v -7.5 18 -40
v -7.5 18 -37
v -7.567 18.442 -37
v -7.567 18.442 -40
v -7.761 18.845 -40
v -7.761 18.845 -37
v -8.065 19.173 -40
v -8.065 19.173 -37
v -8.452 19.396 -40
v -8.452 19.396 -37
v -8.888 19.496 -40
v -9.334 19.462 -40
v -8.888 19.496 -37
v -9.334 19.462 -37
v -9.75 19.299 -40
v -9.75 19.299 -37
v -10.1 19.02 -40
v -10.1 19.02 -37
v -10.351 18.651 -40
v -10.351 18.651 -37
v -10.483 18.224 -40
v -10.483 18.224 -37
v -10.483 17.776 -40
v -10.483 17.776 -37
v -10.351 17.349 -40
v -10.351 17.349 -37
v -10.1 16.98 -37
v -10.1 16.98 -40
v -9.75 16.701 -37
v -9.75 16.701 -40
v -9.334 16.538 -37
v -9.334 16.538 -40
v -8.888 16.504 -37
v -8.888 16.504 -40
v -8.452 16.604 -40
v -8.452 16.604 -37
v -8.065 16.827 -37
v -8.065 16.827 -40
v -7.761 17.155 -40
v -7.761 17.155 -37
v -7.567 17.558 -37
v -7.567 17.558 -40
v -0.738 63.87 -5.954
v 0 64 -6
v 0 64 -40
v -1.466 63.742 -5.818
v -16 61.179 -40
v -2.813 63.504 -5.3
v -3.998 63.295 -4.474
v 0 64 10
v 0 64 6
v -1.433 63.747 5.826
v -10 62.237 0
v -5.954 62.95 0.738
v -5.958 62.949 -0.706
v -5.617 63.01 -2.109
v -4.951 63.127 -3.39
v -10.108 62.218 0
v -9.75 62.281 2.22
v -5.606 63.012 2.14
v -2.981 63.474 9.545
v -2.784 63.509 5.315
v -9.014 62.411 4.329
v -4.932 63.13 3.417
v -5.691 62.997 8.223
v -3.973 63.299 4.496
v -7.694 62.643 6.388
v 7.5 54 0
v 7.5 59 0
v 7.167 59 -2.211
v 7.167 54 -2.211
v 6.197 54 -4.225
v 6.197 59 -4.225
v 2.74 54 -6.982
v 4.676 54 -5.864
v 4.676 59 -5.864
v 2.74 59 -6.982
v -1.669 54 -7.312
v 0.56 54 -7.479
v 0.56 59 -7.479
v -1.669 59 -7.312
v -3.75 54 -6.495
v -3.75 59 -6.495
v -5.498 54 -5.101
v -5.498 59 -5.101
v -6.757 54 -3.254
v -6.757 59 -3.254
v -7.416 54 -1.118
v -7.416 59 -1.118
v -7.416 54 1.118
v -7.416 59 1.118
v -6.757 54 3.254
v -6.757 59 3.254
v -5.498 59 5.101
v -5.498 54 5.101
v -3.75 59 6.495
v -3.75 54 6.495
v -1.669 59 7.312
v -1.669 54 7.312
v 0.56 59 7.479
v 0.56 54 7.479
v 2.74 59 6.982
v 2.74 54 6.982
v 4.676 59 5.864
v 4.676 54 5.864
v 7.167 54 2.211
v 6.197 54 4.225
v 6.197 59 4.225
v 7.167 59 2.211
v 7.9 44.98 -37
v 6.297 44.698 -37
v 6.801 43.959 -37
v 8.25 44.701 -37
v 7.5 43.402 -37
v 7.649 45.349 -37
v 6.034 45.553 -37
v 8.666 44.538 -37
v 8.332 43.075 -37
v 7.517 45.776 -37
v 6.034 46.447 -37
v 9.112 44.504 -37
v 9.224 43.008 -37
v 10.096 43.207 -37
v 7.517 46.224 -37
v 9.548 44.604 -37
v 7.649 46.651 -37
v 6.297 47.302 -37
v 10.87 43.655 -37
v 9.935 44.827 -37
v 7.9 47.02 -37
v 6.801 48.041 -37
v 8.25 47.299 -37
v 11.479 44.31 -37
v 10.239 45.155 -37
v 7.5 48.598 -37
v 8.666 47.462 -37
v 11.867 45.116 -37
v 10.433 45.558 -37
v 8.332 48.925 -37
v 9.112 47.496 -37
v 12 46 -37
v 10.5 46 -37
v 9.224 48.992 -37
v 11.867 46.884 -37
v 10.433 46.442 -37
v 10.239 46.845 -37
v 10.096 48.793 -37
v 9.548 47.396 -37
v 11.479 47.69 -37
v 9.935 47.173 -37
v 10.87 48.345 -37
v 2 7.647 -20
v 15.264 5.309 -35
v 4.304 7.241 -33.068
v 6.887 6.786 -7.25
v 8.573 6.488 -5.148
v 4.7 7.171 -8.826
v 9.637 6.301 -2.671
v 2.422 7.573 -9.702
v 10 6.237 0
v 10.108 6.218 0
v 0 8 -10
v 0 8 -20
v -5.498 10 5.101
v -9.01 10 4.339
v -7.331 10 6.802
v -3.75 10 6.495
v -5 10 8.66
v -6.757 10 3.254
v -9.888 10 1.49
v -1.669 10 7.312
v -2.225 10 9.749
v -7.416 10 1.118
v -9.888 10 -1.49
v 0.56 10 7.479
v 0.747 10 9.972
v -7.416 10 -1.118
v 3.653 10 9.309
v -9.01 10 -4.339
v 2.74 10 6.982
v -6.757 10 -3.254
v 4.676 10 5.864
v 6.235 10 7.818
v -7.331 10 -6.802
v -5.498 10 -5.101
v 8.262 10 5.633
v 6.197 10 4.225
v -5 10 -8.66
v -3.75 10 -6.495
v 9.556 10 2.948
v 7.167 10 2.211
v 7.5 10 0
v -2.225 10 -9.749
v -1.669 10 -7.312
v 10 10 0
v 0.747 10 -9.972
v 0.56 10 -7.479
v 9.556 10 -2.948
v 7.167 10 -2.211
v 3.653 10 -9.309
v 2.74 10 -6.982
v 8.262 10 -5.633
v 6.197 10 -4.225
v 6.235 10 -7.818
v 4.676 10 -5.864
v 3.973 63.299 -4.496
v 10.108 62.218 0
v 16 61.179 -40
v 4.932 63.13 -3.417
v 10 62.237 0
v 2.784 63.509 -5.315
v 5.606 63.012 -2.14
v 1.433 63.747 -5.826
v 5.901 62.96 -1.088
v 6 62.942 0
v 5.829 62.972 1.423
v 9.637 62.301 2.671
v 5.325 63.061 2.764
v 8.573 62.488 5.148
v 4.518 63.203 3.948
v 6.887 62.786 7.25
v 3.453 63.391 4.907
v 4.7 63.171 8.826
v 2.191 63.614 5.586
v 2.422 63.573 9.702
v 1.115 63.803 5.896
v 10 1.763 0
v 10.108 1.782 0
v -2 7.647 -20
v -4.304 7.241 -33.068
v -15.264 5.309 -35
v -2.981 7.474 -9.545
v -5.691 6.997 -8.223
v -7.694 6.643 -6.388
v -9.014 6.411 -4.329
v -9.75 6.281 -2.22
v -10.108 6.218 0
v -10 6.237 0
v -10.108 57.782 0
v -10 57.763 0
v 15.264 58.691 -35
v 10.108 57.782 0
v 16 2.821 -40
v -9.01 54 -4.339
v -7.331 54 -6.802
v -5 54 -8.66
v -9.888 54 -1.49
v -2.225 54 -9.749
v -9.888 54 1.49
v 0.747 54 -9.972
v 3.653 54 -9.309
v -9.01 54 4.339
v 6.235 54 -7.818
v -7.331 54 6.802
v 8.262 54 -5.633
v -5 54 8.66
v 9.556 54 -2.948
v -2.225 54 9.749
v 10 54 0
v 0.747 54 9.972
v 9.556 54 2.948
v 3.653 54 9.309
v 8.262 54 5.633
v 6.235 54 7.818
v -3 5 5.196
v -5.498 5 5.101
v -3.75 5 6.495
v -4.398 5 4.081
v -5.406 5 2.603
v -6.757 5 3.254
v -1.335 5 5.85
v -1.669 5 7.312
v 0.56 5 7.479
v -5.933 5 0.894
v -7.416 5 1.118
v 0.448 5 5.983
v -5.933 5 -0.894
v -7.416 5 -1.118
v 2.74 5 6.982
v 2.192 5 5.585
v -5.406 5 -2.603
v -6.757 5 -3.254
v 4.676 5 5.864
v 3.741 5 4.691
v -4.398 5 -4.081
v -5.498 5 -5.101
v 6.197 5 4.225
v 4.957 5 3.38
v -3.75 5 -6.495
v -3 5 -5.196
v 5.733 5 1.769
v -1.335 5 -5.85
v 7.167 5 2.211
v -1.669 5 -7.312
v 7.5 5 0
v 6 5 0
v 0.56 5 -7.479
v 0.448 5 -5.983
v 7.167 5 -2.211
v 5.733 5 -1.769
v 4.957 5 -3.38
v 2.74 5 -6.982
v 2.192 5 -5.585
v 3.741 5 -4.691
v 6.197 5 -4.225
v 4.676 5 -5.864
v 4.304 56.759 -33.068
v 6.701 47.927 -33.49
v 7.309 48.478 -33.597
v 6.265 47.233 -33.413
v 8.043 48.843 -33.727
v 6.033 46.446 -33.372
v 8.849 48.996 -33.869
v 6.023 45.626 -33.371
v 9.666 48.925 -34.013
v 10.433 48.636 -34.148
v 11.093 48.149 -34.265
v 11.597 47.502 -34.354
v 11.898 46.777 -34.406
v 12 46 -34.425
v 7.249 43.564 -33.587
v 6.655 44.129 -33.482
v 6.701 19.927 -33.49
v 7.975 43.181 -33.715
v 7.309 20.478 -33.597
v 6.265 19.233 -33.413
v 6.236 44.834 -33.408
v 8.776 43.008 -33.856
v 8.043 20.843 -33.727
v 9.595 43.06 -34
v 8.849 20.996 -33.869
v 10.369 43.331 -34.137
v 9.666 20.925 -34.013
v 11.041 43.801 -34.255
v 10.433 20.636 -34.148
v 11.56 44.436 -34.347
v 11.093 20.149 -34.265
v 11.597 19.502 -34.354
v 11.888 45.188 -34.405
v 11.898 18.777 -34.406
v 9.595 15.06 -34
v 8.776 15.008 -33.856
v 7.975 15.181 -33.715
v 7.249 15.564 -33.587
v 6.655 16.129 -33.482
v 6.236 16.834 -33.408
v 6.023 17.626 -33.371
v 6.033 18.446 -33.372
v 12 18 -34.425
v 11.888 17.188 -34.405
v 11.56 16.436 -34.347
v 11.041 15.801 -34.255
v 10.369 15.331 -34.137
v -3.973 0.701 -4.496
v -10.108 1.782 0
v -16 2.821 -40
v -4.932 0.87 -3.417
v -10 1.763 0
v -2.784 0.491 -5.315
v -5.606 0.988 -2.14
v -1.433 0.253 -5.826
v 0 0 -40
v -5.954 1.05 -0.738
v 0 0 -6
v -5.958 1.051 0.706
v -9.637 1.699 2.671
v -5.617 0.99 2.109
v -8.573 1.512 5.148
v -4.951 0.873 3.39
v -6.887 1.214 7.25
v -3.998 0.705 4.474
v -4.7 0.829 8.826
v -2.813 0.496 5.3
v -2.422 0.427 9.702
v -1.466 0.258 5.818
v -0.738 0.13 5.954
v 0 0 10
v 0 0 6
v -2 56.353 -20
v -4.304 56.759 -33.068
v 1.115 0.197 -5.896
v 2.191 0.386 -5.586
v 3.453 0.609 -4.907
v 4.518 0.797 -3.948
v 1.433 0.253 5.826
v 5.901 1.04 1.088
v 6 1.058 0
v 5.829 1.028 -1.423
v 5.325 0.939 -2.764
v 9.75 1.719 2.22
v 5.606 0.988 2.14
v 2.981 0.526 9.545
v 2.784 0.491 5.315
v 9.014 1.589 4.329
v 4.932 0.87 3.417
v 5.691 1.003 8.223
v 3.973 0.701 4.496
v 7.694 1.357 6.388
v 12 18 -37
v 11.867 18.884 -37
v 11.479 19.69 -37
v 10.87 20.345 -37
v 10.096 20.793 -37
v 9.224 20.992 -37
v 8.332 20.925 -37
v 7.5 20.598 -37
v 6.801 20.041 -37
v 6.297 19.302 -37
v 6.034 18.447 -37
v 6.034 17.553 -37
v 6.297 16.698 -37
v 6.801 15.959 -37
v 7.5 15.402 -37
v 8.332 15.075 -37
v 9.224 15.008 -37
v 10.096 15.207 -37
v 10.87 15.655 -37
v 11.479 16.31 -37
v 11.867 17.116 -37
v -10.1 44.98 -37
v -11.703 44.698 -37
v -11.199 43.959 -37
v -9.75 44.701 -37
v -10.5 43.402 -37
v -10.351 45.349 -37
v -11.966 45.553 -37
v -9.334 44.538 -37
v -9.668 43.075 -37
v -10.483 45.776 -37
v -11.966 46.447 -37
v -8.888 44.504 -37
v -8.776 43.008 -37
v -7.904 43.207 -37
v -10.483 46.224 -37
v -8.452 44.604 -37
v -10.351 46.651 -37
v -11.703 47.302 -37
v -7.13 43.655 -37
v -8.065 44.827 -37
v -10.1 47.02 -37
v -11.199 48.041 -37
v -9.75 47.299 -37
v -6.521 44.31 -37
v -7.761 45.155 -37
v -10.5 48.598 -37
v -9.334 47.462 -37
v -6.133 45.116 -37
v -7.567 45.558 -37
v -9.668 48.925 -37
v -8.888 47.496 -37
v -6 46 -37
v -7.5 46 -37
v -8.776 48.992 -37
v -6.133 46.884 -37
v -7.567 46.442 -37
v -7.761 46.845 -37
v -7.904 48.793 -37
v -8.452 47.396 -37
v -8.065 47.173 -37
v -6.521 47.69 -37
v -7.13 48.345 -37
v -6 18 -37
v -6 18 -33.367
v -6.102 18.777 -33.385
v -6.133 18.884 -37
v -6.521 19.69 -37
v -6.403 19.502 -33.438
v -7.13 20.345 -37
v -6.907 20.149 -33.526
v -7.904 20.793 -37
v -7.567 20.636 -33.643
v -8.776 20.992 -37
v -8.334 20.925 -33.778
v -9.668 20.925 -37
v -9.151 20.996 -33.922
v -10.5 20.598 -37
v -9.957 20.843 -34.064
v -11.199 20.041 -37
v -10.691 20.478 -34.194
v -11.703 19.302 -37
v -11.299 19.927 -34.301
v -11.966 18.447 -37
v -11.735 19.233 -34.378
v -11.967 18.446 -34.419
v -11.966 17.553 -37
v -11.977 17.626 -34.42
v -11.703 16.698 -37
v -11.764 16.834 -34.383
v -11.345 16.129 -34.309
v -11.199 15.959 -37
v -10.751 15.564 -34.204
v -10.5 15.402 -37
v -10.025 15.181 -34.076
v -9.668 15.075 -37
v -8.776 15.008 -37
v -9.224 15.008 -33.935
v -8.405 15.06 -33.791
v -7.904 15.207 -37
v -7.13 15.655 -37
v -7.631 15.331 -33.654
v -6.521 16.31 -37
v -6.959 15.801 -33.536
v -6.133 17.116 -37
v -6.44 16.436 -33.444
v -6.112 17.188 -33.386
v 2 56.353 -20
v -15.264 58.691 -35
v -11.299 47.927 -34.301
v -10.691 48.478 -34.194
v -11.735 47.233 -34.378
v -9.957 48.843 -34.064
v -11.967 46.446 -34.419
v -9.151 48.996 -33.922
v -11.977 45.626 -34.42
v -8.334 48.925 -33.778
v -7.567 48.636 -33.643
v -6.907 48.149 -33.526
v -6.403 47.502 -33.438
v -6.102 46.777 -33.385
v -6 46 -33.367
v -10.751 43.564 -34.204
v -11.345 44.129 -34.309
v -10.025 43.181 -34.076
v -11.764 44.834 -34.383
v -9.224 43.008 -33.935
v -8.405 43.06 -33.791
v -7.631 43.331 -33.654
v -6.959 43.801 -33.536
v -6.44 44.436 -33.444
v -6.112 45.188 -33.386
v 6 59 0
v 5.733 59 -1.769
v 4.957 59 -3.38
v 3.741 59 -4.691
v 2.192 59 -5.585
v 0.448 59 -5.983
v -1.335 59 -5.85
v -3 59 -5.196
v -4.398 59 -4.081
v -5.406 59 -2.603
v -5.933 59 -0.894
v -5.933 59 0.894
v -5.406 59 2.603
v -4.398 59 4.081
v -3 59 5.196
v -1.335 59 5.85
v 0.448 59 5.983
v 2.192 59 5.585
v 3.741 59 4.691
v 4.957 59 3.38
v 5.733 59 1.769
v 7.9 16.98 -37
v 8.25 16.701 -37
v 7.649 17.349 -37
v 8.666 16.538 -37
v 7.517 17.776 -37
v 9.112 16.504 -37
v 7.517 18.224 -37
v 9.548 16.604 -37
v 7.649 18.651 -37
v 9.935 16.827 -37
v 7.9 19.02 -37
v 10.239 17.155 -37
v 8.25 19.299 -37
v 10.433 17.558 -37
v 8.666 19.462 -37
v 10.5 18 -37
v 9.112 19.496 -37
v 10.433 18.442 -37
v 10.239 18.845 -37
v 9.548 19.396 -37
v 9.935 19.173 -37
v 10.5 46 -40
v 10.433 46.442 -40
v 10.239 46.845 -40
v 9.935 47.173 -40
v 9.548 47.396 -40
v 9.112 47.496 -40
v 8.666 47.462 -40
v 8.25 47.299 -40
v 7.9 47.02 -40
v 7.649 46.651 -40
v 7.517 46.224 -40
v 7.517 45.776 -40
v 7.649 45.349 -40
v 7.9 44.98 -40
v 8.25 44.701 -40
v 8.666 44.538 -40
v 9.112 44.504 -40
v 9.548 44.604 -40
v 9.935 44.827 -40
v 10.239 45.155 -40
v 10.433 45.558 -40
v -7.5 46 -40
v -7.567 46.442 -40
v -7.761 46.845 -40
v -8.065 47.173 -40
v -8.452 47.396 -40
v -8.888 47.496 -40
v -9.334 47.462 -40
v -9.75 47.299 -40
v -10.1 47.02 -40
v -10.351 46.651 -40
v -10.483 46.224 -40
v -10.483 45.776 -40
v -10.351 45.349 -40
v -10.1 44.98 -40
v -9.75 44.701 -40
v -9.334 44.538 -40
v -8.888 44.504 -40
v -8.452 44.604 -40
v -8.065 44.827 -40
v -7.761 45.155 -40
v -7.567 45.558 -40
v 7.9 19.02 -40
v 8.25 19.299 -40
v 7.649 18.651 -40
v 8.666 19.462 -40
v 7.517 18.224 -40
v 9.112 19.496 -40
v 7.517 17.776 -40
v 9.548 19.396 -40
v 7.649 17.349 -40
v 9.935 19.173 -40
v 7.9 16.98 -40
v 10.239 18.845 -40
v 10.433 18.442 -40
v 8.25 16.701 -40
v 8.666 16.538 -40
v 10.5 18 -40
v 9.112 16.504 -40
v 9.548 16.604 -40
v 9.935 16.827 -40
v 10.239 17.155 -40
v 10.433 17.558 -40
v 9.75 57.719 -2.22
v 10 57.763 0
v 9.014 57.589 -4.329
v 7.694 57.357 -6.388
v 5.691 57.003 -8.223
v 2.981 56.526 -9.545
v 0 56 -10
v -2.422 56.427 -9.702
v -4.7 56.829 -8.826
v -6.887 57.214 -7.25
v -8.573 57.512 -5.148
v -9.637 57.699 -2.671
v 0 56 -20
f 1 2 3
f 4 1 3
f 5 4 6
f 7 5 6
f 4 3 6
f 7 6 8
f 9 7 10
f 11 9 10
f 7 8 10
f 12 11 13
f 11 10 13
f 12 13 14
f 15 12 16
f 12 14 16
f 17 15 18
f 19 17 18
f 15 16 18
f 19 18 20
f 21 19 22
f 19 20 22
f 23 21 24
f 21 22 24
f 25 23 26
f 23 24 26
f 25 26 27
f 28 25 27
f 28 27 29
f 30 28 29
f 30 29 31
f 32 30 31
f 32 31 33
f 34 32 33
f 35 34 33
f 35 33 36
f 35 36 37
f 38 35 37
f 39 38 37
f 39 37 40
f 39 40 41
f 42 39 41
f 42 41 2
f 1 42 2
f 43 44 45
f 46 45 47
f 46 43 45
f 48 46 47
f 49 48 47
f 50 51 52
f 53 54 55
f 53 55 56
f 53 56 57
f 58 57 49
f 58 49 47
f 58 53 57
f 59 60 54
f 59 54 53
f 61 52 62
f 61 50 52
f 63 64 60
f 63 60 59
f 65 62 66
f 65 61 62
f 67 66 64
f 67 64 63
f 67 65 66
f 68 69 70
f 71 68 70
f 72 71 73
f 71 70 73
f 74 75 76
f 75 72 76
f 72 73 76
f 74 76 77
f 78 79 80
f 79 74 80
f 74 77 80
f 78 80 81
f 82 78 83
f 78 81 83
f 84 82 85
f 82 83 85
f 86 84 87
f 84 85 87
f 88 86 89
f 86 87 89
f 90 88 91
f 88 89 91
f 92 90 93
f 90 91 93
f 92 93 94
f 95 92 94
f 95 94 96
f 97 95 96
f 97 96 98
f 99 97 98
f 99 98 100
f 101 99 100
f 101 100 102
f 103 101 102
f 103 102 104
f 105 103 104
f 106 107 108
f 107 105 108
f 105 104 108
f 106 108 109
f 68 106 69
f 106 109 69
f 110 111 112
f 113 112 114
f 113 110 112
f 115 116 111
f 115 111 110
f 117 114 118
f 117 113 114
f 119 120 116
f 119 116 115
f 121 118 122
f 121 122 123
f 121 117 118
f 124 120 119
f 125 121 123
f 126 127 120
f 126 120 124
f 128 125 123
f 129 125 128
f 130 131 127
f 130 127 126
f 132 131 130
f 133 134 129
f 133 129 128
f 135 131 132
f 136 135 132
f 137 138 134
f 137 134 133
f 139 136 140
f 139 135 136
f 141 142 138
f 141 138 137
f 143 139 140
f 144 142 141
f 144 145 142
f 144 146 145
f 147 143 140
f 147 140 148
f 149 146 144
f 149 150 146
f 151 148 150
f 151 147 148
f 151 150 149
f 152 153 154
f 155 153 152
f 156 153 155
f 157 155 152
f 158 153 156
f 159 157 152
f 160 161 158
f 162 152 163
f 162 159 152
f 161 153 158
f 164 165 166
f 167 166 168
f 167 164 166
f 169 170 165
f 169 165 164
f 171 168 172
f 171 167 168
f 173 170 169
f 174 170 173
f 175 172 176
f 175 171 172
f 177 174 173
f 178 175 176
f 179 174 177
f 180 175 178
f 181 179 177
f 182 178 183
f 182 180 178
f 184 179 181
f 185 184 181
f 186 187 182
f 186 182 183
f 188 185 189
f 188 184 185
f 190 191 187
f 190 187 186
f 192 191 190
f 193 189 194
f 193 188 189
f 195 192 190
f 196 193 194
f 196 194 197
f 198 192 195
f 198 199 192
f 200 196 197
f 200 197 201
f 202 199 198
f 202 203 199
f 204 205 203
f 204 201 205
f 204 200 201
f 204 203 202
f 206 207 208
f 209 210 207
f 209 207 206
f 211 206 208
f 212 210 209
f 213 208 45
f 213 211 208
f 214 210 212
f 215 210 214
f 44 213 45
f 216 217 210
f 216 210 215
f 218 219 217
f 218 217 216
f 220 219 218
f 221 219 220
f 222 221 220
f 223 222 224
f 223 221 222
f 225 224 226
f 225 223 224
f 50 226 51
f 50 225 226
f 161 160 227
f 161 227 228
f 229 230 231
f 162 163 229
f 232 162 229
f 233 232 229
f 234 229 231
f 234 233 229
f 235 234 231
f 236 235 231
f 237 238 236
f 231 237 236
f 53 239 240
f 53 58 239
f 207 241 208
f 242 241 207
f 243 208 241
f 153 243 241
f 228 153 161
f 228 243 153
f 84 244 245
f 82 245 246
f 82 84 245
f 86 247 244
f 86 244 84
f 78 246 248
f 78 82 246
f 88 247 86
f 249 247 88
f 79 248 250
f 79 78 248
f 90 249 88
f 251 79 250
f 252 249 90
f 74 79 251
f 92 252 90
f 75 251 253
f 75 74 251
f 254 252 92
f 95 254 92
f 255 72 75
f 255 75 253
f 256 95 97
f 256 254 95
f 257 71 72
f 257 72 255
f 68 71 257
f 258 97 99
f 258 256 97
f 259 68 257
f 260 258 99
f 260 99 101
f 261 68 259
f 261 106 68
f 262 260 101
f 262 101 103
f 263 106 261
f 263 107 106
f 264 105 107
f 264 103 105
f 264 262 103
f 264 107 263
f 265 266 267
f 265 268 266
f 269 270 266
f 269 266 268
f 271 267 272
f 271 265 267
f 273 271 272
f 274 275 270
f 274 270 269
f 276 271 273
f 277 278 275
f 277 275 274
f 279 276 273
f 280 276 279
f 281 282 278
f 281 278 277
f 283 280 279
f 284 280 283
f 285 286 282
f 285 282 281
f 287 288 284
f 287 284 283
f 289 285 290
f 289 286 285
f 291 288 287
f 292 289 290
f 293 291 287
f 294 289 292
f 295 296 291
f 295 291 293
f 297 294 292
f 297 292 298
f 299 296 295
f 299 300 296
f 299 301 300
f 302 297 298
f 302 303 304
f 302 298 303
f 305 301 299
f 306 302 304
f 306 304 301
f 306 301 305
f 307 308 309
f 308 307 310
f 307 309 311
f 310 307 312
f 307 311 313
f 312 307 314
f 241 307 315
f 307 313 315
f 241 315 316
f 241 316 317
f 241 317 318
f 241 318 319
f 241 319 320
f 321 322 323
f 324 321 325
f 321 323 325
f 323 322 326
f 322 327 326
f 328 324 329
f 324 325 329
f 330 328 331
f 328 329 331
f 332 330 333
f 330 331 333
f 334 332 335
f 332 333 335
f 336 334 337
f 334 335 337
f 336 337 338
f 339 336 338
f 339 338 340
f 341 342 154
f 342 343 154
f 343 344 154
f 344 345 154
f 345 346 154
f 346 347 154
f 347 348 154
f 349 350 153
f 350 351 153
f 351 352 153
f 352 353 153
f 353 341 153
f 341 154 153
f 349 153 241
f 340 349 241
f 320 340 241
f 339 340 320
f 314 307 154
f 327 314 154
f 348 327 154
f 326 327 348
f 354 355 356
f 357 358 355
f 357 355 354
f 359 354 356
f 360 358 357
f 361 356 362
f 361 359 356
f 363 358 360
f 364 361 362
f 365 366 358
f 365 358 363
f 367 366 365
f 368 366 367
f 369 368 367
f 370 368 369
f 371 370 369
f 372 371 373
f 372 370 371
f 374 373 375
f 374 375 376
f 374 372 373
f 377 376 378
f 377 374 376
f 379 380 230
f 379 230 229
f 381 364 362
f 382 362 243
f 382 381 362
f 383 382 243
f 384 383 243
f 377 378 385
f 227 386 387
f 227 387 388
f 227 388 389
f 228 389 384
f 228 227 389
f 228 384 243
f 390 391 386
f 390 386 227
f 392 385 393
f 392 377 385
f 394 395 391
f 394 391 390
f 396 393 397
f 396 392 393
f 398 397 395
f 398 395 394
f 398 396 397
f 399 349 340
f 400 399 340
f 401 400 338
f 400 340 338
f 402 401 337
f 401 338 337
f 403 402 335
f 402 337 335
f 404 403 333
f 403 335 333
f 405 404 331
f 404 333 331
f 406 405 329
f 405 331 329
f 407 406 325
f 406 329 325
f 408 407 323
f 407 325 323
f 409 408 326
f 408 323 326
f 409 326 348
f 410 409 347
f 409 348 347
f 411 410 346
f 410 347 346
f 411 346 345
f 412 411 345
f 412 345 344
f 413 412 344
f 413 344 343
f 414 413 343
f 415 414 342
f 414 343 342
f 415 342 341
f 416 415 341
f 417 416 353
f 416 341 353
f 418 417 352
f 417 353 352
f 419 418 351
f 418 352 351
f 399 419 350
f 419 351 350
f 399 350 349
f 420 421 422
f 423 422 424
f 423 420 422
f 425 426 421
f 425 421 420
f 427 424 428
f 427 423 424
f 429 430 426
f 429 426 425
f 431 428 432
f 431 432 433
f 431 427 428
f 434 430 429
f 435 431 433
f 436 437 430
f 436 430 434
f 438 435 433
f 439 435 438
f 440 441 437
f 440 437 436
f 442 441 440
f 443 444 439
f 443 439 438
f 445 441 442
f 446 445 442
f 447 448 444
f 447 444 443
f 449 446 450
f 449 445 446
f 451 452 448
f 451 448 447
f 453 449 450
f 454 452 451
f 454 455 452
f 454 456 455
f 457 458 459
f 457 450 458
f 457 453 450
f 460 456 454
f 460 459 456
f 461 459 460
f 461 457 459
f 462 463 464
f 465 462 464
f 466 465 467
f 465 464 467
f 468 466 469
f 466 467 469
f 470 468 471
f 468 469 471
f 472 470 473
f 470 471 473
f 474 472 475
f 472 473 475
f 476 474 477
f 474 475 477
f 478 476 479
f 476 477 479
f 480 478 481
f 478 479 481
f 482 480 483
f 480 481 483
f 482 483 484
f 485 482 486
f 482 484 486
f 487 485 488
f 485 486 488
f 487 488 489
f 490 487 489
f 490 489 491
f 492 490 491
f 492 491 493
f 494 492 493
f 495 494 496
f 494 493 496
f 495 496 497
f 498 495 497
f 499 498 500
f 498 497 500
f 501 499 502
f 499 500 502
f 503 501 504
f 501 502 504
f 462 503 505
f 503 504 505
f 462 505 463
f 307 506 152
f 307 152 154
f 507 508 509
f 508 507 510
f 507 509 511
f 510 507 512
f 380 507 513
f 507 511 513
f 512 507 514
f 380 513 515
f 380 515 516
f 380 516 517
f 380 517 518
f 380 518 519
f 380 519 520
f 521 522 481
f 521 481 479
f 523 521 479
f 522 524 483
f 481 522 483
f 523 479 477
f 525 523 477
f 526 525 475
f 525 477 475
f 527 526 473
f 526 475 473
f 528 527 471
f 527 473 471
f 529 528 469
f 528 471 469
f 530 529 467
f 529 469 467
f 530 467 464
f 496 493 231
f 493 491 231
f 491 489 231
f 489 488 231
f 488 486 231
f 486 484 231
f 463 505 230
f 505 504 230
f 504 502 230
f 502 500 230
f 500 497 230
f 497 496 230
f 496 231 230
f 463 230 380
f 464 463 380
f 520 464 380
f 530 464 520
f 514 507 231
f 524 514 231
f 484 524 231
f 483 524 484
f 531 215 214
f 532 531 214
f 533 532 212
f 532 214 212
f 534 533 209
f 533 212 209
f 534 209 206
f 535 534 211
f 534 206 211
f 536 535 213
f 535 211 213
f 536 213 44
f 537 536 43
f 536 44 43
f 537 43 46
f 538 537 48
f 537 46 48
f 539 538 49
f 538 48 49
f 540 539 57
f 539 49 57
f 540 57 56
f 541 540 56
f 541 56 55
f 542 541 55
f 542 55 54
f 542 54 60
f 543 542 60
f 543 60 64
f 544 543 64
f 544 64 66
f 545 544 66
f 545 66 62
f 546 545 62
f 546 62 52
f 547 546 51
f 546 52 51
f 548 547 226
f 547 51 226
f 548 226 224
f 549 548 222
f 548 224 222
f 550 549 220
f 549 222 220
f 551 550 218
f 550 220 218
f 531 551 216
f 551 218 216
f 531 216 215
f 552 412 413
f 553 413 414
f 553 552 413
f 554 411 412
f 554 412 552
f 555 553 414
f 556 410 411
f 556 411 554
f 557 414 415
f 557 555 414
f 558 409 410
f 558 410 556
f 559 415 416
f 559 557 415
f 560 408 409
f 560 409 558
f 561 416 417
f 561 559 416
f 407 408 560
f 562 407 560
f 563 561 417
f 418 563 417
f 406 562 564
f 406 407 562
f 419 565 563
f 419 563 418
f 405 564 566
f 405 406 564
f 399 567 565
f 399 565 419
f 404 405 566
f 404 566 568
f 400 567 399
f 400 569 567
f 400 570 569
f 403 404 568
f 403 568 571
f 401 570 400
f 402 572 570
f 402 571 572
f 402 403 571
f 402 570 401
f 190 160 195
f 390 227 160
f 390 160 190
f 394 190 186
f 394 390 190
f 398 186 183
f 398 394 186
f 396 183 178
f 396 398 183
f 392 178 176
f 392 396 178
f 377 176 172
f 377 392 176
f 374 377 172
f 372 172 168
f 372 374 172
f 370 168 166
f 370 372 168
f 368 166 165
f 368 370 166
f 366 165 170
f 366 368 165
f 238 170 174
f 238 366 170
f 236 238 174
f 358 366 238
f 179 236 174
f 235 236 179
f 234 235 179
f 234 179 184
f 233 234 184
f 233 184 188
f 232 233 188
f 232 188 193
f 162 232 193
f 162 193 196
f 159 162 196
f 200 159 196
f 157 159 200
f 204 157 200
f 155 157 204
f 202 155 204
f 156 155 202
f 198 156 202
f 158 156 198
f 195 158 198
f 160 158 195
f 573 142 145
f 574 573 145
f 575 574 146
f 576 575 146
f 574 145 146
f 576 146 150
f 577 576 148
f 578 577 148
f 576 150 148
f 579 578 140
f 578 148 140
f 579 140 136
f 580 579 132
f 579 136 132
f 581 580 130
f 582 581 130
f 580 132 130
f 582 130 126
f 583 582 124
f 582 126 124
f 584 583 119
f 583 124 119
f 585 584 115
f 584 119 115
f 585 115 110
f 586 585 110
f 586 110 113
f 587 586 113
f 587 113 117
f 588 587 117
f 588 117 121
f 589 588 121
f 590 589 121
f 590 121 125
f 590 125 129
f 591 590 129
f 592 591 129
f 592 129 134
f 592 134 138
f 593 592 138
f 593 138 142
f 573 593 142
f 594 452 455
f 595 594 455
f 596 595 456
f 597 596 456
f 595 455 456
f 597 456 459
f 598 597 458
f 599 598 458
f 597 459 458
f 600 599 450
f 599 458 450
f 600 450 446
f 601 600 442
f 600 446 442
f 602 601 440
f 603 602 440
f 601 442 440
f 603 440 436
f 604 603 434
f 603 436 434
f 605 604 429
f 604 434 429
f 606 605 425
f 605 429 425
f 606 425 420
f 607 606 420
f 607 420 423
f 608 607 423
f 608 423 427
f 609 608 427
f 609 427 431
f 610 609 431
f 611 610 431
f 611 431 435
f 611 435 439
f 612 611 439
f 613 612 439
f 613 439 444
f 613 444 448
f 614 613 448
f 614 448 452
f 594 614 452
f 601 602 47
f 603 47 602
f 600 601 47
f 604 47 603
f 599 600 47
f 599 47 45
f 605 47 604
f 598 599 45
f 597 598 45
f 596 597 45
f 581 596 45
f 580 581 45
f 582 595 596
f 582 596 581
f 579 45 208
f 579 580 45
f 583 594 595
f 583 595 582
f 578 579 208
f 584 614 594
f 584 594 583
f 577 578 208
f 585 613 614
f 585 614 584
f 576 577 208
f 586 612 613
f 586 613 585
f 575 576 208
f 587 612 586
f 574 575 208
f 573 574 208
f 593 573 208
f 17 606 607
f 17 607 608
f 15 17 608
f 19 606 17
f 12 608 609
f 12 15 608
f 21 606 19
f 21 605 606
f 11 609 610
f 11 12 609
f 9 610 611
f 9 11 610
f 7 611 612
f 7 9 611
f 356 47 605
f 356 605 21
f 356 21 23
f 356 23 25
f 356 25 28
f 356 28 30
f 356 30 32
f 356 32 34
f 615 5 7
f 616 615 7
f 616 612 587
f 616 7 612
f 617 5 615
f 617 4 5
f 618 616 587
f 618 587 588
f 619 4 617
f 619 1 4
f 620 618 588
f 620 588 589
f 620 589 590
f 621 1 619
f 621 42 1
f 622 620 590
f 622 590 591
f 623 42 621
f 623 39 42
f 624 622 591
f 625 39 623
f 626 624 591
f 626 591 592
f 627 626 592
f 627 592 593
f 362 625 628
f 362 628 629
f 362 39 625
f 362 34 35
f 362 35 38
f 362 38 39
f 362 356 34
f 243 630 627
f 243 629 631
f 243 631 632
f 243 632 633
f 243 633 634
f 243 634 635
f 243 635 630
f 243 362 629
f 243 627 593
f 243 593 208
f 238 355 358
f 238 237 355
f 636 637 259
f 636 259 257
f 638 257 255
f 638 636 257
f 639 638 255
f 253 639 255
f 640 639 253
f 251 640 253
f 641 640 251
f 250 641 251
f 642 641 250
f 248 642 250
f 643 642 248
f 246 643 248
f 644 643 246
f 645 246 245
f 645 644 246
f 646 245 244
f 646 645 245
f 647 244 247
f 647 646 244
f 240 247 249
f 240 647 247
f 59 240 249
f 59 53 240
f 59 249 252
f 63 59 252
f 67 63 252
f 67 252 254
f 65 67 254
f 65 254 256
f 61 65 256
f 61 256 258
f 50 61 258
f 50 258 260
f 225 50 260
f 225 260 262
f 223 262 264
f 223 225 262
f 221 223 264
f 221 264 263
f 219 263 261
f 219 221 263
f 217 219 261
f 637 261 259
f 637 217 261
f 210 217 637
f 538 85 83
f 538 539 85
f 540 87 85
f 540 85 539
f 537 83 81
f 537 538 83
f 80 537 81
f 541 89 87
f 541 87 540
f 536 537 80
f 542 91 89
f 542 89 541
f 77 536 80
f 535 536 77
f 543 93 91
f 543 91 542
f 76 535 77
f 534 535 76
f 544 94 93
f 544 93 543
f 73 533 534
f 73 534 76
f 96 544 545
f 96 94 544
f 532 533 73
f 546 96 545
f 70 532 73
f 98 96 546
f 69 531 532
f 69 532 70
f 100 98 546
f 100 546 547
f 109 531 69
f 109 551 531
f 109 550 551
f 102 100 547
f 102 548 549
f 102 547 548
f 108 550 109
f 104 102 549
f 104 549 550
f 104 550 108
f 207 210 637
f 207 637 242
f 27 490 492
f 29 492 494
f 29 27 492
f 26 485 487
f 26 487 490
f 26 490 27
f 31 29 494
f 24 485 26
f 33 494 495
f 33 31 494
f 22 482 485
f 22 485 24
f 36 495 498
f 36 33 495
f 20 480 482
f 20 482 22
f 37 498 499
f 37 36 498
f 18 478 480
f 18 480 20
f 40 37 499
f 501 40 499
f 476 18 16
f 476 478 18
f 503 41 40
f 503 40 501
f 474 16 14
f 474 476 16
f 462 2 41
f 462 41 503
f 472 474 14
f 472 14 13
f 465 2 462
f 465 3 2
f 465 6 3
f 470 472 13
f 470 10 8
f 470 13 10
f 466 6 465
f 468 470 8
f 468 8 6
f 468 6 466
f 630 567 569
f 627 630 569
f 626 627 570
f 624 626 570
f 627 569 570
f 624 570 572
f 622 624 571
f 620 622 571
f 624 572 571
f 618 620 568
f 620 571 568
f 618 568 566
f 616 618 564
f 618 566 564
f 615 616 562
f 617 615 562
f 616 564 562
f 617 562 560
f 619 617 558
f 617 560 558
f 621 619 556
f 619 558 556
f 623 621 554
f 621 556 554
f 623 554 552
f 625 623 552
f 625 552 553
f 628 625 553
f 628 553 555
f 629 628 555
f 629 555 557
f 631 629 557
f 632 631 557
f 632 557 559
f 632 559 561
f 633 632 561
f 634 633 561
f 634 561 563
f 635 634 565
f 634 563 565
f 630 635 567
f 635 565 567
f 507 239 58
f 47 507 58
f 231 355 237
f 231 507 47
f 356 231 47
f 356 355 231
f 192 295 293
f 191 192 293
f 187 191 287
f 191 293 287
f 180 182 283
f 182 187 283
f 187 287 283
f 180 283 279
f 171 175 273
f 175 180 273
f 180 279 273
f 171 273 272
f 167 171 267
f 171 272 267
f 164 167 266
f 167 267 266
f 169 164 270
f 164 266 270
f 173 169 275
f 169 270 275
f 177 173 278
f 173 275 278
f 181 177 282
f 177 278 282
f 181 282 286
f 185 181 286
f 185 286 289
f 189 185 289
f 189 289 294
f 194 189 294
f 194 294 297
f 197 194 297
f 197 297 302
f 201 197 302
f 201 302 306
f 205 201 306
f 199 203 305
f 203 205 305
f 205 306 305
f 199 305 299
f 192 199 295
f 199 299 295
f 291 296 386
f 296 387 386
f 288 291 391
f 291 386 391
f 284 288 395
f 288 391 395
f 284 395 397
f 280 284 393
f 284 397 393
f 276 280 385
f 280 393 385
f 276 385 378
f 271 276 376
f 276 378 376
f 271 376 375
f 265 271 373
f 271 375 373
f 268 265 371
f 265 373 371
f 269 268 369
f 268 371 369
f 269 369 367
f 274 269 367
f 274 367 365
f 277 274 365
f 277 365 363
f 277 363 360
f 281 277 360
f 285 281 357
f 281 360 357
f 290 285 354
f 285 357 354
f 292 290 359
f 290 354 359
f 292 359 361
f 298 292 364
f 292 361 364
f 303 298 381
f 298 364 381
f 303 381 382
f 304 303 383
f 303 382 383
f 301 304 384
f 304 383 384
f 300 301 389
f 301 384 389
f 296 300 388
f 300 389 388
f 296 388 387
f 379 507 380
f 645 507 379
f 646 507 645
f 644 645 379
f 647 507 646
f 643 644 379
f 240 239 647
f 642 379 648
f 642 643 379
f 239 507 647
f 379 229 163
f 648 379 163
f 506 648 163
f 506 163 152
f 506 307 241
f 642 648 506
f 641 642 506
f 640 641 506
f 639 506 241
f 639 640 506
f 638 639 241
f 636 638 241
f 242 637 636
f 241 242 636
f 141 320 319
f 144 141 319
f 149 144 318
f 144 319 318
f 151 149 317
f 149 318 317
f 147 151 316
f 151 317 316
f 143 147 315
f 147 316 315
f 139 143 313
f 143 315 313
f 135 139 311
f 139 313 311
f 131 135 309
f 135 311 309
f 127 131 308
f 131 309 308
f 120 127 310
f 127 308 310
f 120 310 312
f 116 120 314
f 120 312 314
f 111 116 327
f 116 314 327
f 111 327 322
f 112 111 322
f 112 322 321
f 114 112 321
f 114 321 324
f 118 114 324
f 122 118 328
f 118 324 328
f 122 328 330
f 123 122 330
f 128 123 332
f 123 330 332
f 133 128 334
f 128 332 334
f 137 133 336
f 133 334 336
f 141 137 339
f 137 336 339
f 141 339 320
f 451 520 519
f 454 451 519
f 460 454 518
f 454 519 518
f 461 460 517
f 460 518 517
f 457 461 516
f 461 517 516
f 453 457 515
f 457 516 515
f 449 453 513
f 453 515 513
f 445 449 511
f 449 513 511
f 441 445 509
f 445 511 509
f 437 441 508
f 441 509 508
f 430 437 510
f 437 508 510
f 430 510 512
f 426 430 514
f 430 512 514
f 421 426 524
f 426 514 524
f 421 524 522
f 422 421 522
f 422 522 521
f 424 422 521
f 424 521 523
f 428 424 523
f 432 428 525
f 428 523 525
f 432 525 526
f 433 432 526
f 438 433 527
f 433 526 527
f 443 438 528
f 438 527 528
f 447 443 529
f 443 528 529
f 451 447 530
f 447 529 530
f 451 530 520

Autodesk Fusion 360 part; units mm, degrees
sketch "草图1" plane through (0, 0, 0) normal (0, 1, 0) x (1, 0, 0)
  circle A0 centre (0, 0) radius 10
  circle A1 centre (0, 0) radius 7.5
  circle A2 centre (0, 0) radius 6
  line L0 (-9.8932, -1.4573) -> (-16, 40)
  line L1 (-16, 40) -> (16, 40)
  line L2 (16, 40) -> (9.8932, -1.4573)
  line L3 (0, -55) -> (0, 135) construction
  line L4 (-15.2635, 35) -> (-4.3042, 33.0676)
  line L5 (-4.3042, 33.0676) -> (-2, 20)
  line L6 (-2, 20) -> (2, 20)
  line L7 (2, 20) -> (4.3042, 33.0676)
  line L8 (4.3042, 33.0676) -> (15.2635, 35)
  dimension "d1" = 32
  dimension "d2" = 12
  dimension "d3" = 15
  dimension "d4" = 20
  dimension "d5" = 40
  dimension "d6" = 4
  dimension "d7" = 5
  dimension "d8" = 20
  dimension "d9" = 20
  dimension "d10" = 10
extrude "拉伸1" add sketch "草图1" along normal blind 64 contours L0 L1 L2 L4 L5 L6 L7 L8 makes body 1
extrude "拉伸2" add sketch "草图1" along normal blind 8 separate body contours A0 L0 L2 L4 L5 L6 L7 L8 makes body 2
extrude "拉伸3" add sketch "草图1" along normal blind 10 separate body contours A0 makes body 3
extrude "拉伸4" add sketch "草图1" along normal blind 5 contours A1 bodies 3
copy_body "复制和粘贴实体1" bodies 2 makes body 4
move_body "移动1" bodies 4 to x (1, 0, 0) y (0, 1, 0) z (0, 0, 1) at (0, 14, 0)
move_body "移动2" bodies 4 to x (1, 0, 0) y (0, 1, 0) z (0, 0, 1) at (0, 42, 0)
sketch "草图2" plane through (0, 0, 0) normal (0, 0, 1) x (1, 0, 0)
  line L0 (0, 60) -> (0, -25) construction
  line L1 (0, 0) -> (16, 2.8212)
  line L2 (16, 2.8212) -> (16, 5.1788)
  line L3 (16, 5.1788) -> (0, 8)
  line L4 (0, 8) -> (-16, 5.1788)
  line L5 (-16, 5.1788) -> (-16, 2.8212)
  line L6 (-16, 2.8212) -> (0, 0)
  line L7 (0, 56) -> (16, 58.8212)
  line L8 (16, 58.8212) -> (16, 61.1788)
  line L9 (16, 61.1788) -> (0, 64)
  line L10 (0, 64) -> (-16, 61.1788)
  line L11 (-16, 61.1788) -> (-16, 58.8212)
  line L12 (-16, 58.8212) -> (0, 56)
  line L13 (10, 0) -> (-10, 0)
  line L14 (0, 8) -> (15, 8) construction
  line L15 (0, 56) -> (15, 56) construction
  line L16 (0, 64) -> (14, 64) construction
  line L17 (0, 64) -> (-16, 64)
  line L18 (-16, 64) -> (-16, 0)
  line L19 (-16, 0) -> (16, 0)
  line L20 (16, 0) -> (16, 64)
  line L21 (16, 64) -> (0, 64)
  dimension "d19" = 64
  dimension "d20" = 10
  dimension "d21" = 48
  dimension "d22" = 10
  dimension "d23" = 10
  dimension "d24" = 32
  dimension "d25" = 32
extrude "拉伸5" cut sketch "草图2" against normal blind 160 contours L1 L2 L3 L4 L5 L6 L18 L20 | L7 L8 L9 L10 L11 L12 L18 L20 keep common part bodies 2 4
extrude "拉伸6" cut sketch "草图2" against normal blind 105 contours L1 L2 L3 L4 L5 L6 L18 L20 | L3 L4 L7 L12 L18 L20 | L7 L8 L9 L10 L11 L12 L18 L20 keep common part bodies 1
extrude "拉伸7" cut sketch "草图2" along normal mid plane 30 contours L6 L13 L18 L19 | L1 L13 L19 L20 bodies 3
copy_body "复制和粘贴实体2" bodies 3 makes body 5
move_body "移动3" bodies 5 to x (1, 0, 0) y (0, -1, 0) z (0, 0, -1) at (0, 50, 0)
move_body "移动4" bodies 5 to x (1, 0, 0) y (0, 1, 0) z (0, 0, 1) at (0, 14, 0)
combine "合并1" operation add target body 1 tool bodies 2 3 5 4
sketch "草图3" plane through (0, 0, 0) normal (0, 0, 1) x (1, 0, 0)
  line L0 (16, 0) -> (-16, 0)
  line L1 (-16, 0) -> (-16, 64)
  line L2 (-16, 64) -> (16, 64)
  line L3 (16, 64) -> (16, 0)
  line L4 (0, -10) -> (0, 70) construction
  circle A0 centre (9, 18) radius 3
  circle A1 centre (9, 18) radius 1.5
  circle A2 centre (-9, 18) radius 3
  circle A3 centre (-9, 18) radius 1.5
  circle A4 centre (9, 46) radius 3
  circle A5 centre (9, 46) radius 1.5
  circle A6 centre (-9, 46) radius 3
  circle A7 centre (-9, 46) radius 1.5
  line L5 (16, 32) -> (-16, 32) construction
  dimension "d32" = 32
  dimension "d33" = 64
  dimension "d34" = 6
  dimension "d35" = 3
  dimension "d36" = 28
  dimension "d37" = 28
  dimension "d38" = 18
extrude "拉伸8" cut sketch "草图3" against normal through all contours A1 | A3 | A5 | A7 bodies 1
extrude "拉伸9" cut sketch "草图3" against normal blind 37 contours A0 | A2 | A4 | A6 bodies 1
